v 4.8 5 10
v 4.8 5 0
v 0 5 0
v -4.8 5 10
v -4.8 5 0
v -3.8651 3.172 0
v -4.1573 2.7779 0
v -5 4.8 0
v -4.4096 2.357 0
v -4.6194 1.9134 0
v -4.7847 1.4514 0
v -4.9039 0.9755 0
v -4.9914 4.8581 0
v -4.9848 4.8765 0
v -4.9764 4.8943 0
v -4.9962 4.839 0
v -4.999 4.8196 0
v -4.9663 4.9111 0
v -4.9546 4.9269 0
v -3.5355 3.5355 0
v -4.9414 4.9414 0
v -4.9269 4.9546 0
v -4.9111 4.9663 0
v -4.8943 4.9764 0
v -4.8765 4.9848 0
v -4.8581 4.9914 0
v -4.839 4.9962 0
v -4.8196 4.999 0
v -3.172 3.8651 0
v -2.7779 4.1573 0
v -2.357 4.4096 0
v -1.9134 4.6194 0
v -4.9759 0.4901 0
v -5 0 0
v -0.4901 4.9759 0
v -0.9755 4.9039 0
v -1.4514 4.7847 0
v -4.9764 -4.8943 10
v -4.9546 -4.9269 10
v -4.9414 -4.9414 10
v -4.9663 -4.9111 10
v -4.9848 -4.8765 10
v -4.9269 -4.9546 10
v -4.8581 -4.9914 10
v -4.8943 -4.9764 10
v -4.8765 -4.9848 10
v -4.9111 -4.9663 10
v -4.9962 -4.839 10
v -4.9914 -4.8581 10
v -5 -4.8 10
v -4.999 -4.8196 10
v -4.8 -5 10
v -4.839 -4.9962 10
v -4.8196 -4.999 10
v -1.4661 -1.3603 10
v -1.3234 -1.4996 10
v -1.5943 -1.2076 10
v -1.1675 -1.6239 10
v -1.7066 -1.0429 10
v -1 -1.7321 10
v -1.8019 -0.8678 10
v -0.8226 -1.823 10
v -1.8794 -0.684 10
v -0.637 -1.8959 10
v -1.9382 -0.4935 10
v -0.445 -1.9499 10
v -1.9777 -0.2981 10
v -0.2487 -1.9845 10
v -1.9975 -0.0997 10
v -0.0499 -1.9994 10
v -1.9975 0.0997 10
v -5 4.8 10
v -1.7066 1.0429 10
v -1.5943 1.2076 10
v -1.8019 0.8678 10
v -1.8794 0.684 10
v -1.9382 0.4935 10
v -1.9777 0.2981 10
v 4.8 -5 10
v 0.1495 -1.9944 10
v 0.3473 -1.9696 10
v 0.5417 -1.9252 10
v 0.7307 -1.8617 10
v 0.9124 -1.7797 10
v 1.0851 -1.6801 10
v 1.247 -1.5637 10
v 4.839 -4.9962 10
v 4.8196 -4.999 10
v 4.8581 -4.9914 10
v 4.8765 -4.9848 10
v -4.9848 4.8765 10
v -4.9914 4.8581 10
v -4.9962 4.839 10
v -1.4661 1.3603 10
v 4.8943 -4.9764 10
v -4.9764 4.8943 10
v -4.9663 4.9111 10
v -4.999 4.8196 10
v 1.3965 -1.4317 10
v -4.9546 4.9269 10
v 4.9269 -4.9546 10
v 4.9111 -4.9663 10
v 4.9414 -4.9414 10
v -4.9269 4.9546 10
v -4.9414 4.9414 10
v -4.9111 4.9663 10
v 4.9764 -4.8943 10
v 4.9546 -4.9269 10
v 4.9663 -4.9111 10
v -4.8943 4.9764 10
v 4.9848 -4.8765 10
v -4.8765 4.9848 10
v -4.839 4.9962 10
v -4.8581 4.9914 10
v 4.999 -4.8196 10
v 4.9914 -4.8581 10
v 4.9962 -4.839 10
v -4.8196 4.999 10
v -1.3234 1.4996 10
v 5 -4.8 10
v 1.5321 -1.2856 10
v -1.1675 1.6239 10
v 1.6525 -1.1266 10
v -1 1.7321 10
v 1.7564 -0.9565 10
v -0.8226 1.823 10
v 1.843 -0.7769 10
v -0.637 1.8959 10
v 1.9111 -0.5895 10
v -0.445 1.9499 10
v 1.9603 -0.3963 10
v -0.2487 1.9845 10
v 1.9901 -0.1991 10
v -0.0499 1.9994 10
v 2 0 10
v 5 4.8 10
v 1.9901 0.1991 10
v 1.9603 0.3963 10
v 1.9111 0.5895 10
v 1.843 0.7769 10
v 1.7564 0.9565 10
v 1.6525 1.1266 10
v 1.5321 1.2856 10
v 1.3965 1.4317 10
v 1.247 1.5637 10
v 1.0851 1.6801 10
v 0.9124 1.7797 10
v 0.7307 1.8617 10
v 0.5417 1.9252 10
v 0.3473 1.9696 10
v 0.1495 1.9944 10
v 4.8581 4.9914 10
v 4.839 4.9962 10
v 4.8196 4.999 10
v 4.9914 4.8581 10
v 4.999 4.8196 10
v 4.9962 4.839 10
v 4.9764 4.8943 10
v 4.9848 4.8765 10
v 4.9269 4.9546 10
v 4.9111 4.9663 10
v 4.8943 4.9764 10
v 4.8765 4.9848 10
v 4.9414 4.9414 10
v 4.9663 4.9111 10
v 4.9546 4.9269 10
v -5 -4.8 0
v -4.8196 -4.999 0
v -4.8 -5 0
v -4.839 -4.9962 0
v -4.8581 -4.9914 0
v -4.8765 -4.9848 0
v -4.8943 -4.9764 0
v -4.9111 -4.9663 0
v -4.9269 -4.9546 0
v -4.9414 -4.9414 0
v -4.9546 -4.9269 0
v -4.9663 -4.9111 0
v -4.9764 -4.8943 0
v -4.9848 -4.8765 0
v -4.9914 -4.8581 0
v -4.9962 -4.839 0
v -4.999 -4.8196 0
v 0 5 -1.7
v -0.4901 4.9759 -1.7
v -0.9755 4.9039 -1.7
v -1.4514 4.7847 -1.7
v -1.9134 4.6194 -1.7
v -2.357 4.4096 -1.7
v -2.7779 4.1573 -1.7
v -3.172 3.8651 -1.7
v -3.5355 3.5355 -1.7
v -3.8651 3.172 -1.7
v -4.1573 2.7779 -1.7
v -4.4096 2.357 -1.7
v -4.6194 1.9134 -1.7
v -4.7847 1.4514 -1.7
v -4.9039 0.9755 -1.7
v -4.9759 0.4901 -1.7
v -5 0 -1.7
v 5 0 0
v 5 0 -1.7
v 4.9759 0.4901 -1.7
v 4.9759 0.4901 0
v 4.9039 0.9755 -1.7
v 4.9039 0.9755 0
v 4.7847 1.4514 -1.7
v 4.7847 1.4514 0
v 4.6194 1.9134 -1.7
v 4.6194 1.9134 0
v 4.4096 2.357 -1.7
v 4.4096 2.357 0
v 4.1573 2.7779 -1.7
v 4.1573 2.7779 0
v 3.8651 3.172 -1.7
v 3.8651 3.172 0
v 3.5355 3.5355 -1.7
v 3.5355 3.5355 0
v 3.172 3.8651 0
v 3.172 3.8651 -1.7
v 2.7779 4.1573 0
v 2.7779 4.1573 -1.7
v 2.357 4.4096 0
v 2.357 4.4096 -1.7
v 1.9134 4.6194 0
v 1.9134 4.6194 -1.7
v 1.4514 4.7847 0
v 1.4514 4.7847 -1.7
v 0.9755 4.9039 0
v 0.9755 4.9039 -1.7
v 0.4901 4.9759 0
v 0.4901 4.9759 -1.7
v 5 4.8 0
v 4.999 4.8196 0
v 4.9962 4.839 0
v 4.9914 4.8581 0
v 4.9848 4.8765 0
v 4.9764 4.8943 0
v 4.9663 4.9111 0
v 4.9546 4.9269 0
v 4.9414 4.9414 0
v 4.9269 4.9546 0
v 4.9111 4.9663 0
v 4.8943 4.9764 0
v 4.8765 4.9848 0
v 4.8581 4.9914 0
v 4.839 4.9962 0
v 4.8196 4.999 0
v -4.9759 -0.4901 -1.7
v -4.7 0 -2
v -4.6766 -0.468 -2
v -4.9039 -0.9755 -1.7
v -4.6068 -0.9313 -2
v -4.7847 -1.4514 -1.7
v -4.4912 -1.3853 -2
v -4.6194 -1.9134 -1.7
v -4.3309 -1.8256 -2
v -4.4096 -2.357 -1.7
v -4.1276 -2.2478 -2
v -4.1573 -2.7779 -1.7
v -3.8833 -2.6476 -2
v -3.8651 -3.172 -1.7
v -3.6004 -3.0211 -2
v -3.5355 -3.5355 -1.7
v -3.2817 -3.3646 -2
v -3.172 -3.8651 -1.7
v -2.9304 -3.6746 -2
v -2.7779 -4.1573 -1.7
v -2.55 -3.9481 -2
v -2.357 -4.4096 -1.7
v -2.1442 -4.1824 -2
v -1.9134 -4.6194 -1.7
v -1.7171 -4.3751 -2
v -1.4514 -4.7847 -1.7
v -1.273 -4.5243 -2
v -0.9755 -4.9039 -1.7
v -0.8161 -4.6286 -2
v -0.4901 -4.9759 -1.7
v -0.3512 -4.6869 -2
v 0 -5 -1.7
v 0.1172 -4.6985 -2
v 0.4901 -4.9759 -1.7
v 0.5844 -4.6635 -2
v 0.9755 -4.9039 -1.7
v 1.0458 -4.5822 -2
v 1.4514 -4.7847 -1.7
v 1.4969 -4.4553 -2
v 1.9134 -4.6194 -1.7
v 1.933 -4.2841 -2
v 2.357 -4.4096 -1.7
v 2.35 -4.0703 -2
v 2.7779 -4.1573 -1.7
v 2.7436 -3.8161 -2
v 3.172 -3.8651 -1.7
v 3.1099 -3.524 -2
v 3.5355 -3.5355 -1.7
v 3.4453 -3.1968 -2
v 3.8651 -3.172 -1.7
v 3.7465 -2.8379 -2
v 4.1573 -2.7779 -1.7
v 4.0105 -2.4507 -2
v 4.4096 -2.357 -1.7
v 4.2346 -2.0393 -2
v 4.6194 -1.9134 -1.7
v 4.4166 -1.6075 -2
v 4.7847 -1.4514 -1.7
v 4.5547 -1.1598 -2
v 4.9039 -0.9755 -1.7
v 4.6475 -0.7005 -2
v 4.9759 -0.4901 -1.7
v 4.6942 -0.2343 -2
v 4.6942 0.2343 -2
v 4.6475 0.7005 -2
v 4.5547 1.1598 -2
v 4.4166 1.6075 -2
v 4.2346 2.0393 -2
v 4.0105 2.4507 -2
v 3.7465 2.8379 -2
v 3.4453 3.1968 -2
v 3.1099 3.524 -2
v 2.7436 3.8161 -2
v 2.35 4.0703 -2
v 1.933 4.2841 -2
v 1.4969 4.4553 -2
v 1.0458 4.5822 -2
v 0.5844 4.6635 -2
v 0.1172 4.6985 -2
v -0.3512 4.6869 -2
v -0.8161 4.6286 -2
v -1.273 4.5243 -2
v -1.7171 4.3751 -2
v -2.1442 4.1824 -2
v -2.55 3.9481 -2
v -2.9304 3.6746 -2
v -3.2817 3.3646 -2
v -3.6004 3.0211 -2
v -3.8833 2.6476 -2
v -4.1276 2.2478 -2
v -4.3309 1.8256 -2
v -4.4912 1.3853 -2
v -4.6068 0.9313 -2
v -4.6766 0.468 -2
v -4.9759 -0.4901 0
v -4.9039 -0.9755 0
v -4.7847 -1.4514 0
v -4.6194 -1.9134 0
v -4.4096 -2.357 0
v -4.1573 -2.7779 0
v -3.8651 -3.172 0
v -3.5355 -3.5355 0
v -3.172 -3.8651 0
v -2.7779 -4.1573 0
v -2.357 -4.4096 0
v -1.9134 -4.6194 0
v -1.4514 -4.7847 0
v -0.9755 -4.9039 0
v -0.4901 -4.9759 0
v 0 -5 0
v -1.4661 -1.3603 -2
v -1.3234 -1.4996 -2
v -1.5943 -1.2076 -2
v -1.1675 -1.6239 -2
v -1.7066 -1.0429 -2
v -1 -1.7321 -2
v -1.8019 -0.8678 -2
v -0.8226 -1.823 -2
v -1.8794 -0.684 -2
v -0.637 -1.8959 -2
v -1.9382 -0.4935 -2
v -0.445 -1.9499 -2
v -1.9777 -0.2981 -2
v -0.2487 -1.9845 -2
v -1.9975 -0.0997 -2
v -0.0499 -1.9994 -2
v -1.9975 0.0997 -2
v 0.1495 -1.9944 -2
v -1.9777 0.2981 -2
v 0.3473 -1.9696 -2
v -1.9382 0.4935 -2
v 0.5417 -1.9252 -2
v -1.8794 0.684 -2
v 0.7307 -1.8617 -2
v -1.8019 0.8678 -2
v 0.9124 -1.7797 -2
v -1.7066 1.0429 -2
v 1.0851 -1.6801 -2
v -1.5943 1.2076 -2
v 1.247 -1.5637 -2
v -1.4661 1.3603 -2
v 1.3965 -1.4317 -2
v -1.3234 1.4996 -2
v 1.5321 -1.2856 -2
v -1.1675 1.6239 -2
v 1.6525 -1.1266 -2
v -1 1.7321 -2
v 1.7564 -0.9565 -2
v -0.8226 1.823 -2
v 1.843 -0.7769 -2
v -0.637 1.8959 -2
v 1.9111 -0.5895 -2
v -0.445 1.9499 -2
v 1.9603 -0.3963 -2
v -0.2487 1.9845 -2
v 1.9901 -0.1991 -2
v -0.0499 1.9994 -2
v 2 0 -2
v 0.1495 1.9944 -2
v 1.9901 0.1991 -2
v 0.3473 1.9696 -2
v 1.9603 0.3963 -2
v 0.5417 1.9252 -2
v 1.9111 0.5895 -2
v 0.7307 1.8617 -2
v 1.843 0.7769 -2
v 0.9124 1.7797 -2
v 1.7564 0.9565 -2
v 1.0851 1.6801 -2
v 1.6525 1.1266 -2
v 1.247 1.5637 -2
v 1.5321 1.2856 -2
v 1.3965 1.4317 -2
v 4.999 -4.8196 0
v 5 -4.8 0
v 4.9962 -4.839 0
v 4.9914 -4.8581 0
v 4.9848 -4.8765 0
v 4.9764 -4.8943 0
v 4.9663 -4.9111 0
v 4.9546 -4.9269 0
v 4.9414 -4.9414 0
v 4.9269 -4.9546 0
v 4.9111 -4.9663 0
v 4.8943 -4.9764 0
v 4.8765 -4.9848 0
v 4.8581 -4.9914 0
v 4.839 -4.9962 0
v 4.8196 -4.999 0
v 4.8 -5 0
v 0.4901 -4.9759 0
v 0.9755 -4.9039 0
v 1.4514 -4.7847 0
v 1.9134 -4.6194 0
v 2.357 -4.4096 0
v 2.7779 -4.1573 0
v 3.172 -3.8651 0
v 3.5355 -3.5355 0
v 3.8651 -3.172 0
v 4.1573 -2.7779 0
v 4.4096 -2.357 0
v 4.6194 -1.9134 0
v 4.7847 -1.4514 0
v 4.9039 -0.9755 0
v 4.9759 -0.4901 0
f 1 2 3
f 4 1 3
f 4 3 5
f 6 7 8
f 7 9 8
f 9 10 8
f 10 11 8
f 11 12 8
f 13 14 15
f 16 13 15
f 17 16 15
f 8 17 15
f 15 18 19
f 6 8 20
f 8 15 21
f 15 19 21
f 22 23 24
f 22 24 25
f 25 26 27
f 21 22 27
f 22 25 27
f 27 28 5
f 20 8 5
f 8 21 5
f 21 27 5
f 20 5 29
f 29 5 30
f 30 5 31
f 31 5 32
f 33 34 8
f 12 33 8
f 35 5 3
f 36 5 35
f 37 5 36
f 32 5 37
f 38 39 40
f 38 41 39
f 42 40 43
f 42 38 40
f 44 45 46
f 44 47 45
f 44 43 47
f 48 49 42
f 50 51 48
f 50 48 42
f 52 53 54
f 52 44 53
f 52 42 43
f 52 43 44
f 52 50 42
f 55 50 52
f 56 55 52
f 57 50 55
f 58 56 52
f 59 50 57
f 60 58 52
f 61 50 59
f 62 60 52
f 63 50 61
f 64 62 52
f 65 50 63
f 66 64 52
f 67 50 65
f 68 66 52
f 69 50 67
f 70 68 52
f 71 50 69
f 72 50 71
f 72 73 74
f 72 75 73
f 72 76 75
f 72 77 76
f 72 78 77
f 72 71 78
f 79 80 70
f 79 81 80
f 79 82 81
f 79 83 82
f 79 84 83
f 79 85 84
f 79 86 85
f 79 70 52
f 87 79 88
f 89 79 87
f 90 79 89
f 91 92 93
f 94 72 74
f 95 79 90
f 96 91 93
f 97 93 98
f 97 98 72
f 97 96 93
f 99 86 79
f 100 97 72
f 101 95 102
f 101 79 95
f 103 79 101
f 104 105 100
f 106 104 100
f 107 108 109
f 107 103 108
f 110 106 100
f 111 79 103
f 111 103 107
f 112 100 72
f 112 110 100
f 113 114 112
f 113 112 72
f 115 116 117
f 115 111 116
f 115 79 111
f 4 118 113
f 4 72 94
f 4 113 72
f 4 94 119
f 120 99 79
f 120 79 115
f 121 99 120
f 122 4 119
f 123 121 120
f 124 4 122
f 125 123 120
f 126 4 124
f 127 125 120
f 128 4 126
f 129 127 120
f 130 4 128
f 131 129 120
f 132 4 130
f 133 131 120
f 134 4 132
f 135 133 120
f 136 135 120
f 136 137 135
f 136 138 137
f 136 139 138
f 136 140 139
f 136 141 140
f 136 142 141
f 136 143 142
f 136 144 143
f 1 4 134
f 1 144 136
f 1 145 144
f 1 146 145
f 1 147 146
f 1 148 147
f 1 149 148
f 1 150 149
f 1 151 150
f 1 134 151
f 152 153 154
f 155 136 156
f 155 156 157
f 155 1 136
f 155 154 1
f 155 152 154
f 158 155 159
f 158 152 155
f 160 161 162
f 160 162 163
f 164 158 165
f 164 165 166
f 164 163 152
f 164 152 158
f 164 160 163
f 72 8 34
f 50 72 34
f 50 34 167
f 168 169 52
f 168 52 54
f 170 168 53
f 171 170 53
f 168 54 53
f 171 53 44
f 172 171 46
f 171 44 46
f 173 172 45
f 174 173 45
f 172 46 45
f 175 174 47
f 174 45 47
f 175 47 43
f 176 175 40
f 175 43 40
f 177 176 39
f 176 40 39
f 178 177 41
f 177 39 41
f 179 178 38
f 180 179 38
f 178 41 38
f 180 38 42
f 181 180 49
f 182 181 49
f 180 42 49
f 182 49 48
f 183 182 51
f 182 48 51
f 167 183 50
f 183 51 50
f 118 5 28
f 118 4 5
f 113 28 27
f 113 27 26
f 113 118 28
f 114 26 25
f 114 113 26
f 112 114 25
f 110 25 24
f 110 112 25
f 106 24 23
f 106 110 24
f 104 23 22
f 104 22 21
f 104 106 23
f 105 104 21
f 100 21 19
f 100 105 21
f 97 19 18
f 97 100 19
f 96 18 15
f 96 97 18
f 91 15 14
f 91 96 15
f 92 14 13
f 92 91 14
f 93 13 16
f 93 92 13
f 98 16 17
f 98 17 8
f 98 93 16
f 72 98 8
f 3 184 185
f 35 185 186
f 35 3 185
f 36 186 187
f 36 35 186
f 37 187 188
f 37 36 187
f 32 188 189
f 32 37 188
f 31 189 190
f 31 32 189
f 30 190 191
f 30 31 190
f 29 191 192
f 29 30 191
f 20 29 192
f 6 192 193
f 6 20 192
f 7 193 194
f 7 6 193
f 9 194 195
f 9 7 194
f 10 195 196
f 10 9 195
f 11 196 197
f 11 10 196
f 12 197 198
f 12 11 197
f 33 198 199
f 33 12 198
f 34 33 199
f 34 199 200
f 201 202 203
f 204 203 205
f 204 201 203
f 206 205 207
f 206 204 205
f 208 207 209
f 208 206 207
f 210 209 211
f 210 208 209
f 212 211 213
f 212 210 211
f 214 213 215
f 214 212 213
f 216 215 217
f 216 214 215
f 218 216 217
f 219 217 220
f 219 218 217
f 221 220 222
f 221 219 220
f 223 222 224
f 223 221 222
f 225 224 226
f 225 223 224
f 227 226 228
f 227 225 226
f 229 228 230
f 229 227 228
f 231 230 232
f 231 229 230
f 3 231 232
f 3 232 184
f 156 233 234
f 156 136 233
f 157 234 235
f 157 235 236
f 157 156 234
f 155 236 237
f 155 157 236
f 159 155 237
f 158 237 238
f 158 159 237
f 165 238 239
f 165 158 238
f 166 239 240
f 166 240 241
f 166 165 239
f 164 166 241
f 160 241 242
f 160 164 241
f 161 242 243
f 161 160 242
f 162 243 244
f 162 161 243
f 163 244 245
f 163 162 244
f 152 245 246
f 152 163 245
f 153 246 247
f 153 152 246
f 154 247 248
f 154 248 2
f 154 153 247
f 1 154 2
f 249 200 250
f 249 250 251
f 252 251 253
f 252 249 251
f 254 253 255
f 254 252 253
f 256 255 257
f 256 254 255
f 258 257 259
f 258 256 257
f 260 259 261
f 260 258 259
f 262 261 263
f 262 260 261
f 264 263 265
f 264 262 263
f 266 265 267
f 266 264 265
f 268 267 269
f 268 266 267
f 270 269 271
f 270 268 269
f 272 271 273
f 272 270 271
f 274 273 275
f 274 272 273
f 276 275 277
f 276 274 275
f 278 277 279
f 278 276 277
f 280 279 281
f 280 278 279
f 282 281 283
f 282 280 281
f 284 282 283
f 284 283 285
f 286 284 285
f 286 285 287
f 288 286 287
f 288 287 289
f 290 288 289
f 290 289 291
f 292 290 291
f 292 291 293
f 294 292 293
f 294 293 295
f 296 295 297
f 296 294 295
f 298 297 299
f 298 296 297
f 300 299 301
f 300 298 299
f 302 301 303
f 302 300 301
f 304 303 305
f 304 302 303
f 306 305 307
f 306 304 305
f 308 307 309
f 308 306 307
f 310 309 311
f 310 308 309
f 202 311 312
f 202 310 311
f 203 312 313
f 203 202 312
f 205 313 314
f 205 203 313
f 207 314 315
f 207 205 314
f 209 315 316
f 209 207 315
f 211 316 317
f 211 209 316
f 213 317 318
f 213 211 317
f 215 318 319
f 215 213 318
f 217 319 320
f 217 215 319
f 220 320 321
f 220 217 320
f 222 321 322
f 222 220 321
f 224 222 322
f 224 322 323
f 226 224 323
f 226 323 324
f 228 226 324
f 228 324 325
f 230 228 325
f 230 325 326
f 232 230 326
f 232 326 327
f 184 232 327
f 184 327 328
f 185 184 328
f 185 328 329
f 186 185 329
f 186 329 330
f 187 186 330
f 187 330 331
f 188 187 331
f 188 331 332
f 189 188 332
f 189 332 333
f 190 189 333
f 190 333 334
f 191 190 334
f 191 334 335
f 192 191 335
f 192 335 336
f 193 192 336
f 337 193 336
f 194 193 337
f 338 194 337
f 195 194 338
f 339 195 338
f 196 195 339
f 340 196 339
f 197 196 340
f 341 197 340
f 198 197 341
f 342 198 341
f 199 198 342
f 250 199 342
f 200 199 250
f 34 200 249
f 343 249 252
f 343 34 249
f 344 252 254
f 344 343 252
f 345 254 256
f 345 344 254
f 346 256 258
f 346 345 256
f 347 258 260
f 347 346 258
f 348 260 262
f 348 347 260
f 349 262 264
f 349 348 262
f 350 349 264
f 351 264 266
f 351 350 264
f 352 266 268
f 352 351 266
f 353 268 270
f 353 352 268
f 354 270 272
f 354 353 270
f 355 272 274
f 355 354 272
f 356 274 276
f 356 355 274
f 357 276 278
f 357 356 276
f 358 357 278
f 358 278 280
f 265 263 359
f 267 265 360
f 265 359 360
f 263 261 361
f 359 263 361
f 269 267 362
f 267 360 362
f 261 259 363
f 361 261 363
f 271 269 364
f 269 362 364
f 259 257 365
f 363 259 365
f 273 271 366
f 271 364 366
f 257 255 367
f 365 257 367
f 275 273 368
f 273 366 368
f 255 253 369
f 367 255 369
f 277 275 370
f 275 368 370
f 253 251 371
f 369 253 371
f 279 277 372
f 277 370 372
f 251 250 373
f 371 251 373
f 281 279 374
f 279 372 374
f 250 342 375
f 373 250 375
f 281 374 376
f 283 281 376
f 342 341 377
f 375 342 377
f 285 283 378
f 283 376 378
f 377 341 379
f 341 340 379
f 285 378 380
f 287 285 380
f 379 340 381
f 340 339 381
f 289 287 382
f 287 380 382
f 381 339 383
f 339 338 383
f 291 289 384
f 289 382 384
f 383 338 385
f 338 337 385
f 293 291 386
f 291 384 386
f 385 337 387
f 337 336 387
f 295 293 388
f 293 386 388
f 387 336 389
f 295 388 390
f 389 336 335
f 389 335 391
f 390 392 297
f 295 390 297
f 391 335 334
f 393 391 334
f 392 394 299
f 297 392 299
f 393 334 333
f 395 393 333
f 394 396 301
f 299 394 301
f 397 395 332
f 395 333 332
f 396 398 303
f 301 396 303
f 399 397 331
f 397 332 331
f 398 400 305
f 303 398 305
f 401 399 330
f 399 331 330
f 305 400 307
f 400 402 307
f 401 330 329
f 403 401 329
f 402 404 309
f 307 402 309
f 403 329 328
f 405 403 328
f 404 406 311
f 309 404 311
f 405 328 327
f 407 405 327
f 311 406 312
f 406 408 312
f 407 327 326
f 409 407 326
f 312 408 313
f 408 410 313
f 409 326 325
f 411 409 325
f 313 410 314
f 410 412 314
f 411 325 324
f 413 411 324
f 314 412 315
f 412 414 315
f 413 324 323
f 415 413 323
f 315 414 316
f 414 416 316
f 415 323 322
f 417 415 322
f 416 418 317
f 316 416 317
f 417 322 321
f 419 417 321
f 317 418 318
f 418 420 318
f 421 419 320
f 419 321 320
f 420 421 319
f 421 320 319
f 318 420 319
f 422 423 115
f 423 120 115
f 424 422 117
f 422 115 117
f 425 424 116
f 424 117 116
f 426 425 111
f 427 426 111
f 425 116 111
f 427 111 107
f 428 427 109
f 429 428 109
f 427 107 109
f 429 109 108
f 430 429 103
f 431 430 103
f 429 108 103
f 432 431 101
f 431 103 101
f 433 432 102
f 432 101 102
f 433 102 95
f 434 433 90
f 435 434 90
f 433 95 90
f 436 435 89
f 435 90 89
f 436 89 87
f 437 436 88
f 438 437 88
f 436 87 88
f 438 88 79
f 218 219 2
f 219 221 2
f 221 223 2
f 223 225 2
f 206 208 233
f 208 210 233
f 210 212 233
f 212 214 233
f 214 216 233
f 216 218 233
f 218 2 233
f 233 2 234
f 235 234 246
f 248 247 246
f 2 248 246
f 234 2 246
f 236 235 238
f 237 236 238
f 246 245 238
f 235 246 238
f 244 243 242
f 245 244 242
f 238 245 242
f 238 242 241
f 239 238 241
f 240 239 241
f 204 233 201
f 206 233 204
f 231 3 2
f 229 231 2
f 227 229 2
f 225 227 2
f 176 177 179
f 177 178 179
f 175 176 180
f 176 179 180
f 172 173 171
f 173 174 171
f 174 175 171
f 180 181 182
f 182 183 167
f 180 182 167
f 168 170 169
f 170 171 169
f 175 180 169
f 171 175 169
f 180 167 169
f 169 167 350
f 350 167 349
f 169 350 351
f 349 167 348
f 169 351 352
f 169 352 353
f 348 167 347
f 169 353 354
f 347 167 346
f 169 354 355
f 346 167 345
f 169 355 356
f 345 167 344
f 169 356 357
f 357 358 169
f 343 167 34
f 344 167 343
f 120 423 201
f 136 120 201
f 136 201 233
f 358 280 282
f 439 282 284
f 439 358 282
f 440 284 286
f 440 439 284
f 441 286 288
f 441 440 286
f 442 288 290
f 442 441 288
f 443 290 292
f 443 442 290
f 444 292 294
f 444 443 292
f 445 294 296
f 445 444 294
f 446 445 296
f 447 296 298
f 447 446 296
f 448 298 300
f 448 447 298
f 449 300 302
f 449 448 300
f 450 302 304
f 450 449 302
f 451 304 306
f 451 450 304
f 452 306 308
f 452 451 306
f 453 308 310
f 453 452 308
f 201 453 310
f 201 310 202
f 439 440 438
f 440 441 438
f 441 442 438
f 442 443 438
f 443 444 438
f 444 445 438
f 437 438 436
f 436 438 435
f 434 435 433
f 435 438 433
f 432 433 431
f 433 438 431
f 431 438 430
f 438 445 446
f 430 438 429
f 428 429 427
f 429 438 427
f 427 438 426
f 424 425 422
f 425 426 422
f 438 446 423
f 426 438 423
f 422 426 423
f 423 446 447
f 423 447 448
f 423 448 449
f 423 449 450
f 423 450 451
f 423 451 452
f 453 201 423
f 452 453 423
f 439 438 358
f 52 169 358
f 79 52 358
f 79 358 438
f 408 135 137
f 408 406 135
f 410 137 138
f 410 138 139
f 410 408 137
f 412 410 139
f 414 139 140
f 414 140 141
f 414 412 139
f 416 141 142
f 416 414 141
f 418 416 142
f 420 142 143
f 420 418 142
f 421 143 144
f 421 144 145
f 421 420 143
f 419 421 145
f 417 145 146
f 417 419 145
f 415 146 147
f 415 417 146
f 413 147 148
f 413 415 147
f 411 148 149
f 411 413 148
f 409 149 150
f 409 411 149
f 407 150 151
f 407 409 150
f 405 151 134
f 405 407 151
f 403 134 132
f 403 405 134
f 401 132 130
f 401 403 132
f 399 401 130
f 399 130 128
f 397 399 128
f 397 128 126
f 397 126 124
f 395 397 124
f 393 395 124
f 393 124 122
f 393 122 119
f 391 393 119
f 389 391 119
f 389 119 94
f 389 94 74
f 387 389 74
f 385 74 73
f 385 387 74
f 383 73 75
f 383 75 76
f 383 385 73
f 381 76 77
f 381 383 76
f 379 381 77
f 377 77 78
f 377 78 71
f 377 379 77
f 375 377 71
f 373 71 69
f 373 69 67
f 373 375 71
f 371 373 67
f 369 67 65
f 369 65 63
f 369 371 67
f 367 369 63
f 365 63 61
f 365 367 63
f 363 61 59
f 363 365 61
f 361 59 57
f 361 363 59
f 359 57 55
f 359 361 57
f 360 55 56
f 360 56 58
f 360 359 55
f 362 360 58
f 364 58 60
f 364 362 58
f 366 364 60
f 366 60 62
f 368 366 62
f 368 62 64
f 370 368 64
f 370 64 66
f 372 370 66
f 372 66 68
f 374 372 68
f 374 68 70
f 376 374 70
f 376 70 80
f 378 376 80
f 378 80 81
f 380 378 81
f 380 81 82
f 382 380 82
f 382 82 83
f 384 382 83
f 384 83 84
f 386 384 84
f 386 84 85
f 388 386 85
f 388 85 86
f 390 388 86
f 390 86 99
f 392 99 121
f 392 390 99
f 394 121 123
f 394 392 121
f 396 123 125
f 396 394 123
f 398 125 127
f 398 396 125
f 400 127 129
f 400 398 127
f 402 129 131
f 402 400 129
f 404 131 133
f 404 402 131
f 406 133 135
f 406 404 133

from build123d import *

# Parameters (mm, degrees)
F0_R     = 2
F1_DEPTH = 10
F2_DEPTH = 2
F4_R     = 0.2


# Not quite as in the source:
# - a fillet or chamfer that OpenCascade refuses, or shapes differently, is made with other operations: its cross-section is extruded or revolved along the edge and cut away or added


with BuildPart() as f1:
    # F0 (on Top) → F1 (new body)
    with BuildSketch(Plane.XY):
        with BuildLine():
            Line((5, 0), (5, 5))
            Line((5, 5), (0, 5))
            ThreePointArc((0, 5), (3.5355339059, 3.5355339059), (5, 0))
        make_face()
        with BuildLine():
            ThreePointArc((-5, 0), (-3.5355339059, 3.5355339059), (0, 5))
            Line((0, 5), (-5, 5))
            Line((-5, 5), (-5, 0))
        make_face()
        with BuildLine():
            ThreePointArc((5, 0), (3.5355339059, 3.5355339059), (0, 5))
            ThreePointArc((0, 5), (-3.5355339059, 3.5355339059), (-5, 0))
            ThreePointArc((-5, 0), (-3.5355339059, -3.5355339059), (0, -5))
            ThreePointArc((0, -5), (3.5355339059, -3.5355339059), (5, 0))
        make_face()
        Circle(F0_R, mode=Mode.SUBTRACT)
        with BuildLine():
            Line((5, -5), (5, 0))
            ThreePointArc((5, 0), (3.5355339059, -3.5355339059), (0, -5))
            Line((0, -5), (5, -5))
        make_face()
        with BuildLine():
            ThreePointArc((0, -5), (-3.5355339059, -3.5355339059), (-5, 0))
            Line((-5, 0), (-5, -5))
            Line((-5, -5), (0, -5))
        make_face()
    extrude(amount=F1_DEPTH)

    # F0 (on Top) → F2 (join)
    with BuildSketch(Plane.XY):
        with BuildLine():
            ThreePointArc((5, 0), (3.5355339059, 3.5355339059), (0, 5))
            ThreePointArc((0, 5), (-3.5355339059, 3.5355339059), (-5, 0))
            ThreePointArc((-5, 0), (-3.5355339059, -3.5355339059), (0, -5))
            ThreePointArc((0, -5), (3.5355339059, -3.5355339059), (5, 0))
        make_face()
        Circle(F0_R, mode=Mode.SUBTRACT)
    extrude(amount=-F2_DEPTH)

    # F3: chamfer of 0.3 on 1 edges, made by hand

    # F3_s1 → F3_t2 (revolve, cut)
    with BuildSketch(Plane.XZ):
        Polygon((-4.7, -2), (-5, -1.7), (-5, -2), align=None)
    revolve(axis=Axis((0, 0, -2), (0, 0, 1)), mode=Mode.SUBTRACT)

    # F4
    f4_edges = [f1.edges().sort_by_distance(p)[0] for p in [
        (5, 5, 5),
        (5, -5, 5),
        (-5, 5, 5),
        (-5, -5, 5),
    ]]
    fillet(f4_edges, radius=F4_R)


solid = f1.part
